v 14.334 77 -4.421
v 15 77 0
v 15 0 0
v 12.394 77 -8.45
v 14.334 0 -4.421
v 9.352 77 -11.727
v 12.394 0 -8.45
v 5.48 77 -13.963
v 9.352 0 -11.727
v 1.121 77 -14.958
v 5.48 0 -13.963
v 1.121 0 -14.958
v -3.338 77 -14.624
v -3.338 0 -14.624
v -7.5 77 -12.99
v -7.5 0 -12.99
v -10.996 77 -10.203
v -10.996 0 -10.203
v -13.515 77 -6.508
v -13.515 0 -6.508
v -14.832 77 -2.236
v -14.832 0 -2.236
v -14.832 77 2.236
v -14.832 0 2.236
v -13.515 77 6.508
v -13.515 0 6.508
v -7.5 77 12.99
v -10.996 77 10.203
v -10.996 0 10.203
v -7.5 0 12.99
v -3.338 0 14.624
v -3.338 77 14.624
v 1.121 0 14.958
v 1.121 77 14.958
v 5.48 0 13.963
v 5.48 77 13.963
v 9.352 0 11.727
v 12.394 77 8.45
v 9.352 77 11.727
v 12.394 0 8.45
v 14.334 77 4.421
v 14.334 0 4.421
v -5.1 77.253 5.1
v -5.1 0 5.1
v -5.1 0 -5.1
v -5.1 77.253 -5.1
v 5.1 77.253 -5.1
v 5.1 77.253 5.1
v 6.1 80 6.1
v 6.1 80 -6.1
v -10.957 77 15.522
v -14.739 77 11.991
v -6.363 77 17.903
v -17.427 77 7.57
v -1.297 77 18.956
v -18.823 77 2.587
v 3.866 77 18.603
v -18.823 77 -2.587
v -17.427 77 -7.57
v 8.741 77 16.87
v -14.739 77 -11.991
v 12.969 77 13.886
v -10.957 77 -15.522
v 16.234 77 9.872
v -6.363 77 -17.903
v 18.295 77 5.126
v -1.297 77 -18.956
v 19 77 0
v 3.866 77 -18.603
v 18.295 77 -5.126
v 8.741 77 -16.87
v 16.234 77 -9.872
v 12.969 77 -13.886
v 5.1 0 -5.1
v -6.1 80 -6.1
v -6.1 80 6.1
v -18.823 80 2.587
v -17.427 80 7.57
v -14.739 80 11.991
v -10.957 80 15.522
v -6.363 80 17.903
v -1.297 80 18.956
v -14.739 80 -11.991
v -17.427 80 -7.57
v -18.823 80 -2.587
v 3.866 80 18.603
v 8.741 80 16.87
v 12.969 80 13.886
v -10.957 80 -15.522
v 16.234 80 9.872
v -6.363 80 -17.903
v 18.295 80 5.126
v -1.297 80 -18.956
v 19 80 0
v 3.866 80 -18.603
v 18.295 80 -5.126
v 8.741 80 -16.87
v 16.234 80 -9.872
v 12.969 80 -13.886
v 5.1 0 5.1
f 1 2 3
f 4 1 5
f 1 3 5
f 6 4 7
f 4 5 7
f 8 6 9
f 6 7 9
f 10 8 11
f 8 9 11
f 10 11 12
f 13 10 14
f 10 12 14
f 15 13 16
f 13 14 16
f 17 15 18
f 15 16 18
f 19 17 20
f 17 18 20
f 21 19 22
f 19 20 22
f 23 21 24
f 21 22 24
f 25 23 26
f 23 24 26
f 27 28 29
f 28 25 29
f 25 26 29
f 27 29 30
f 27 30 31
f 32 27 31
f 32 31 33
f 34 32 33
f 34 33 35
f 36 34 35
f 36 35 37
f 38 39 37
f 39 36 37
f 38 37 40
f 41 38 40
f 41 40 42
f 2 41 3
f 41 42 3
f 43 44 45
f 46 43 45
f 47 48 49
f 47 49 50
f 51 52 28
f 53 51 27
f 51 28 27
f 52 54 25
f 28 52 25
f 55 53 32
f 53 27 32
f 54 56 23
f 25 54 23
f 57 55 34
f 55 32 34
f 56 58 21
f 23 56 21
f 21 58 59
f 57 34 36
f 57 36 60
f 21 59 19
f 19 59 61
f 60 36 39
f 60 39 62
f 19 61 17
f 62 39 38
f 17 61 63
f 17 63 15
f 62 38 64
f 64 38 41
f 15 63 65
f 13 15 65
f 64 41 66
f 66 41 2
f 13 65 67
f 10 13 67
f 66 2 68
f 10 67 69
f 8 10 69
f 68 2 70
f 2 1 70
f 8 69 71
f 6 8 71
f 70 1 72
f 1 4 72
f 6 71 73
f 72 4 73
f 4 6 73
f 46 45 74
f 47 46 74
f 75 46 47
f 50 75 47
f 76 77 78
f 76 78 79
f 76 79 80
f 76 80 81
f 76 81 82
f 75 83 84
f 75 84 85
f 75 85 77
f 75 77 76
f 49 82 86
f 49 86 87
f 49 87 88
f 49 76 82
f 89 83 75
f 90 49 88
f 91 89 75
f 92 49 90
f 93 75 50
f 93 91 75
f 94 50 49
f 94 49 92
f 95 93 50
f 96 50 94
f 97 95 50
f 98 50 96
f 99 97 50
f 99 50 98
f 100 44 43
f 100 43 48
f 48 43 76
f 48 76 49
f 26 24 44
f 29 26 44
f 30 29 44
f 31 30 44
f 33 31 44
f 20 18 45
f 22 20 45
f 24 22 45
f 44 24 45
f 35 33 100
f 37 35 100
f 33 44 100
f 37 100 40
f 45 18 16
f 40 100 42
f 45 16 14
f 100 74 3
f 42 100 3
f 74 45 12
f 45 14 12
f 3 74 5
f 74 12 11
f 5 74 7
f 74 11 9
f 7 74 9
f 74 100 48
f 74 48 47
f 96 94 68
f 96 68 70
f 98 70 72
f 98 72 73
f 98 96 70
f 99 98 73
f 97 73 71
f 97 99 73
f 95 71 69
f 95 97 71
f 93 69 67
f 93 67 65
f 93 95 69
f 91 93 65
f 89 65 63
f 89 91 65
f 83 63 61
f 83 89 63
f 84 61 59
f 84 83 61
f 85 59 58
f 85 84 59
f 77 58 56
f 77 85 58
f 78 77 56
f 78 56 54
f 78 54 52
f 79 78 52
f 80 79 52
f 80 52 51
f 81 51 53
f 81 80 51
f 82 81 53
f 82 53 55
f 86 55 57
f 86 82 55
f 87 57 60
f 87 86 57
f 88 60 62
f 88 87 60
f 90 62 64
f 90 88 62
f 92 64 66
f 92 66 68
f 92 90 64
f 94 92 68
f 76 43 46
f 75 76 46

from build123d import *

# Parameters (mm, degrees)
SKETCH_1_R          = 15
SKETCH_1_W          = 10.2
SKETCH_1_H          = 10.2
EXTRUDE_1_DEPTH     = 80
SKETCH1_R           = 19
SKETCH1_W           = 10.2
SKETCH1_H           = 10.2
BOSS_EXTRUDE1_DEPTH = 3
CHAMFER1_SIZE       = 1
CHAMFER1_SIZE2      = 2.747477419


with BuildPart() as part:
    # Эскиз1 → Бобышка-Вытянуть1 (new body)
    with BuildSketch(Plane(origin=(0, 0, 0), x_dir=(1, 0, 0), z_dir=(0, 1, 0))):
        Circle(SKETCH_1_R)
        Rectangle(SKETCH_1_W, SKETCH_1_H, mode=Mode.SUBTRACT)
    extrude(amount=EXTRUDE_1_DEPTH)

    # Sketch1 → Boss-Extrude1 (add)
    with BuildSketch(Plane(origin=(0, 80, 0), x_dir=(1, 0, 0), z_dir=(0, 1, 0))):
        Circle(SKETCH1_R)
        Rectangle(SKETCH1_W, SKETCH1_H, mode=Mode.SUBTRACT)
    extrude(amount=-BOSS_EXTRUDE1_DEPTH)

    # Chamfer1
    chamfer1_edges = [part.edges().sort_by_distance(p)[0] for p in [
        (0, 80, -5.1),
        (-5.1, 80, 0),
        (0, 80, 5.1),
        (5.1, 80, 0),
    ]]
    chamfer1_side = [part.faces().sort_by_distance(p)[0] for p in [
        (-18.462598846, 80, 0),
    ]]
    chamfer(chamfer1_edges, length=CHAMFER1_SIZE, length2=CHAMFER1_SIZE2, reference=chamfer1_side[0])


solid = part.part
